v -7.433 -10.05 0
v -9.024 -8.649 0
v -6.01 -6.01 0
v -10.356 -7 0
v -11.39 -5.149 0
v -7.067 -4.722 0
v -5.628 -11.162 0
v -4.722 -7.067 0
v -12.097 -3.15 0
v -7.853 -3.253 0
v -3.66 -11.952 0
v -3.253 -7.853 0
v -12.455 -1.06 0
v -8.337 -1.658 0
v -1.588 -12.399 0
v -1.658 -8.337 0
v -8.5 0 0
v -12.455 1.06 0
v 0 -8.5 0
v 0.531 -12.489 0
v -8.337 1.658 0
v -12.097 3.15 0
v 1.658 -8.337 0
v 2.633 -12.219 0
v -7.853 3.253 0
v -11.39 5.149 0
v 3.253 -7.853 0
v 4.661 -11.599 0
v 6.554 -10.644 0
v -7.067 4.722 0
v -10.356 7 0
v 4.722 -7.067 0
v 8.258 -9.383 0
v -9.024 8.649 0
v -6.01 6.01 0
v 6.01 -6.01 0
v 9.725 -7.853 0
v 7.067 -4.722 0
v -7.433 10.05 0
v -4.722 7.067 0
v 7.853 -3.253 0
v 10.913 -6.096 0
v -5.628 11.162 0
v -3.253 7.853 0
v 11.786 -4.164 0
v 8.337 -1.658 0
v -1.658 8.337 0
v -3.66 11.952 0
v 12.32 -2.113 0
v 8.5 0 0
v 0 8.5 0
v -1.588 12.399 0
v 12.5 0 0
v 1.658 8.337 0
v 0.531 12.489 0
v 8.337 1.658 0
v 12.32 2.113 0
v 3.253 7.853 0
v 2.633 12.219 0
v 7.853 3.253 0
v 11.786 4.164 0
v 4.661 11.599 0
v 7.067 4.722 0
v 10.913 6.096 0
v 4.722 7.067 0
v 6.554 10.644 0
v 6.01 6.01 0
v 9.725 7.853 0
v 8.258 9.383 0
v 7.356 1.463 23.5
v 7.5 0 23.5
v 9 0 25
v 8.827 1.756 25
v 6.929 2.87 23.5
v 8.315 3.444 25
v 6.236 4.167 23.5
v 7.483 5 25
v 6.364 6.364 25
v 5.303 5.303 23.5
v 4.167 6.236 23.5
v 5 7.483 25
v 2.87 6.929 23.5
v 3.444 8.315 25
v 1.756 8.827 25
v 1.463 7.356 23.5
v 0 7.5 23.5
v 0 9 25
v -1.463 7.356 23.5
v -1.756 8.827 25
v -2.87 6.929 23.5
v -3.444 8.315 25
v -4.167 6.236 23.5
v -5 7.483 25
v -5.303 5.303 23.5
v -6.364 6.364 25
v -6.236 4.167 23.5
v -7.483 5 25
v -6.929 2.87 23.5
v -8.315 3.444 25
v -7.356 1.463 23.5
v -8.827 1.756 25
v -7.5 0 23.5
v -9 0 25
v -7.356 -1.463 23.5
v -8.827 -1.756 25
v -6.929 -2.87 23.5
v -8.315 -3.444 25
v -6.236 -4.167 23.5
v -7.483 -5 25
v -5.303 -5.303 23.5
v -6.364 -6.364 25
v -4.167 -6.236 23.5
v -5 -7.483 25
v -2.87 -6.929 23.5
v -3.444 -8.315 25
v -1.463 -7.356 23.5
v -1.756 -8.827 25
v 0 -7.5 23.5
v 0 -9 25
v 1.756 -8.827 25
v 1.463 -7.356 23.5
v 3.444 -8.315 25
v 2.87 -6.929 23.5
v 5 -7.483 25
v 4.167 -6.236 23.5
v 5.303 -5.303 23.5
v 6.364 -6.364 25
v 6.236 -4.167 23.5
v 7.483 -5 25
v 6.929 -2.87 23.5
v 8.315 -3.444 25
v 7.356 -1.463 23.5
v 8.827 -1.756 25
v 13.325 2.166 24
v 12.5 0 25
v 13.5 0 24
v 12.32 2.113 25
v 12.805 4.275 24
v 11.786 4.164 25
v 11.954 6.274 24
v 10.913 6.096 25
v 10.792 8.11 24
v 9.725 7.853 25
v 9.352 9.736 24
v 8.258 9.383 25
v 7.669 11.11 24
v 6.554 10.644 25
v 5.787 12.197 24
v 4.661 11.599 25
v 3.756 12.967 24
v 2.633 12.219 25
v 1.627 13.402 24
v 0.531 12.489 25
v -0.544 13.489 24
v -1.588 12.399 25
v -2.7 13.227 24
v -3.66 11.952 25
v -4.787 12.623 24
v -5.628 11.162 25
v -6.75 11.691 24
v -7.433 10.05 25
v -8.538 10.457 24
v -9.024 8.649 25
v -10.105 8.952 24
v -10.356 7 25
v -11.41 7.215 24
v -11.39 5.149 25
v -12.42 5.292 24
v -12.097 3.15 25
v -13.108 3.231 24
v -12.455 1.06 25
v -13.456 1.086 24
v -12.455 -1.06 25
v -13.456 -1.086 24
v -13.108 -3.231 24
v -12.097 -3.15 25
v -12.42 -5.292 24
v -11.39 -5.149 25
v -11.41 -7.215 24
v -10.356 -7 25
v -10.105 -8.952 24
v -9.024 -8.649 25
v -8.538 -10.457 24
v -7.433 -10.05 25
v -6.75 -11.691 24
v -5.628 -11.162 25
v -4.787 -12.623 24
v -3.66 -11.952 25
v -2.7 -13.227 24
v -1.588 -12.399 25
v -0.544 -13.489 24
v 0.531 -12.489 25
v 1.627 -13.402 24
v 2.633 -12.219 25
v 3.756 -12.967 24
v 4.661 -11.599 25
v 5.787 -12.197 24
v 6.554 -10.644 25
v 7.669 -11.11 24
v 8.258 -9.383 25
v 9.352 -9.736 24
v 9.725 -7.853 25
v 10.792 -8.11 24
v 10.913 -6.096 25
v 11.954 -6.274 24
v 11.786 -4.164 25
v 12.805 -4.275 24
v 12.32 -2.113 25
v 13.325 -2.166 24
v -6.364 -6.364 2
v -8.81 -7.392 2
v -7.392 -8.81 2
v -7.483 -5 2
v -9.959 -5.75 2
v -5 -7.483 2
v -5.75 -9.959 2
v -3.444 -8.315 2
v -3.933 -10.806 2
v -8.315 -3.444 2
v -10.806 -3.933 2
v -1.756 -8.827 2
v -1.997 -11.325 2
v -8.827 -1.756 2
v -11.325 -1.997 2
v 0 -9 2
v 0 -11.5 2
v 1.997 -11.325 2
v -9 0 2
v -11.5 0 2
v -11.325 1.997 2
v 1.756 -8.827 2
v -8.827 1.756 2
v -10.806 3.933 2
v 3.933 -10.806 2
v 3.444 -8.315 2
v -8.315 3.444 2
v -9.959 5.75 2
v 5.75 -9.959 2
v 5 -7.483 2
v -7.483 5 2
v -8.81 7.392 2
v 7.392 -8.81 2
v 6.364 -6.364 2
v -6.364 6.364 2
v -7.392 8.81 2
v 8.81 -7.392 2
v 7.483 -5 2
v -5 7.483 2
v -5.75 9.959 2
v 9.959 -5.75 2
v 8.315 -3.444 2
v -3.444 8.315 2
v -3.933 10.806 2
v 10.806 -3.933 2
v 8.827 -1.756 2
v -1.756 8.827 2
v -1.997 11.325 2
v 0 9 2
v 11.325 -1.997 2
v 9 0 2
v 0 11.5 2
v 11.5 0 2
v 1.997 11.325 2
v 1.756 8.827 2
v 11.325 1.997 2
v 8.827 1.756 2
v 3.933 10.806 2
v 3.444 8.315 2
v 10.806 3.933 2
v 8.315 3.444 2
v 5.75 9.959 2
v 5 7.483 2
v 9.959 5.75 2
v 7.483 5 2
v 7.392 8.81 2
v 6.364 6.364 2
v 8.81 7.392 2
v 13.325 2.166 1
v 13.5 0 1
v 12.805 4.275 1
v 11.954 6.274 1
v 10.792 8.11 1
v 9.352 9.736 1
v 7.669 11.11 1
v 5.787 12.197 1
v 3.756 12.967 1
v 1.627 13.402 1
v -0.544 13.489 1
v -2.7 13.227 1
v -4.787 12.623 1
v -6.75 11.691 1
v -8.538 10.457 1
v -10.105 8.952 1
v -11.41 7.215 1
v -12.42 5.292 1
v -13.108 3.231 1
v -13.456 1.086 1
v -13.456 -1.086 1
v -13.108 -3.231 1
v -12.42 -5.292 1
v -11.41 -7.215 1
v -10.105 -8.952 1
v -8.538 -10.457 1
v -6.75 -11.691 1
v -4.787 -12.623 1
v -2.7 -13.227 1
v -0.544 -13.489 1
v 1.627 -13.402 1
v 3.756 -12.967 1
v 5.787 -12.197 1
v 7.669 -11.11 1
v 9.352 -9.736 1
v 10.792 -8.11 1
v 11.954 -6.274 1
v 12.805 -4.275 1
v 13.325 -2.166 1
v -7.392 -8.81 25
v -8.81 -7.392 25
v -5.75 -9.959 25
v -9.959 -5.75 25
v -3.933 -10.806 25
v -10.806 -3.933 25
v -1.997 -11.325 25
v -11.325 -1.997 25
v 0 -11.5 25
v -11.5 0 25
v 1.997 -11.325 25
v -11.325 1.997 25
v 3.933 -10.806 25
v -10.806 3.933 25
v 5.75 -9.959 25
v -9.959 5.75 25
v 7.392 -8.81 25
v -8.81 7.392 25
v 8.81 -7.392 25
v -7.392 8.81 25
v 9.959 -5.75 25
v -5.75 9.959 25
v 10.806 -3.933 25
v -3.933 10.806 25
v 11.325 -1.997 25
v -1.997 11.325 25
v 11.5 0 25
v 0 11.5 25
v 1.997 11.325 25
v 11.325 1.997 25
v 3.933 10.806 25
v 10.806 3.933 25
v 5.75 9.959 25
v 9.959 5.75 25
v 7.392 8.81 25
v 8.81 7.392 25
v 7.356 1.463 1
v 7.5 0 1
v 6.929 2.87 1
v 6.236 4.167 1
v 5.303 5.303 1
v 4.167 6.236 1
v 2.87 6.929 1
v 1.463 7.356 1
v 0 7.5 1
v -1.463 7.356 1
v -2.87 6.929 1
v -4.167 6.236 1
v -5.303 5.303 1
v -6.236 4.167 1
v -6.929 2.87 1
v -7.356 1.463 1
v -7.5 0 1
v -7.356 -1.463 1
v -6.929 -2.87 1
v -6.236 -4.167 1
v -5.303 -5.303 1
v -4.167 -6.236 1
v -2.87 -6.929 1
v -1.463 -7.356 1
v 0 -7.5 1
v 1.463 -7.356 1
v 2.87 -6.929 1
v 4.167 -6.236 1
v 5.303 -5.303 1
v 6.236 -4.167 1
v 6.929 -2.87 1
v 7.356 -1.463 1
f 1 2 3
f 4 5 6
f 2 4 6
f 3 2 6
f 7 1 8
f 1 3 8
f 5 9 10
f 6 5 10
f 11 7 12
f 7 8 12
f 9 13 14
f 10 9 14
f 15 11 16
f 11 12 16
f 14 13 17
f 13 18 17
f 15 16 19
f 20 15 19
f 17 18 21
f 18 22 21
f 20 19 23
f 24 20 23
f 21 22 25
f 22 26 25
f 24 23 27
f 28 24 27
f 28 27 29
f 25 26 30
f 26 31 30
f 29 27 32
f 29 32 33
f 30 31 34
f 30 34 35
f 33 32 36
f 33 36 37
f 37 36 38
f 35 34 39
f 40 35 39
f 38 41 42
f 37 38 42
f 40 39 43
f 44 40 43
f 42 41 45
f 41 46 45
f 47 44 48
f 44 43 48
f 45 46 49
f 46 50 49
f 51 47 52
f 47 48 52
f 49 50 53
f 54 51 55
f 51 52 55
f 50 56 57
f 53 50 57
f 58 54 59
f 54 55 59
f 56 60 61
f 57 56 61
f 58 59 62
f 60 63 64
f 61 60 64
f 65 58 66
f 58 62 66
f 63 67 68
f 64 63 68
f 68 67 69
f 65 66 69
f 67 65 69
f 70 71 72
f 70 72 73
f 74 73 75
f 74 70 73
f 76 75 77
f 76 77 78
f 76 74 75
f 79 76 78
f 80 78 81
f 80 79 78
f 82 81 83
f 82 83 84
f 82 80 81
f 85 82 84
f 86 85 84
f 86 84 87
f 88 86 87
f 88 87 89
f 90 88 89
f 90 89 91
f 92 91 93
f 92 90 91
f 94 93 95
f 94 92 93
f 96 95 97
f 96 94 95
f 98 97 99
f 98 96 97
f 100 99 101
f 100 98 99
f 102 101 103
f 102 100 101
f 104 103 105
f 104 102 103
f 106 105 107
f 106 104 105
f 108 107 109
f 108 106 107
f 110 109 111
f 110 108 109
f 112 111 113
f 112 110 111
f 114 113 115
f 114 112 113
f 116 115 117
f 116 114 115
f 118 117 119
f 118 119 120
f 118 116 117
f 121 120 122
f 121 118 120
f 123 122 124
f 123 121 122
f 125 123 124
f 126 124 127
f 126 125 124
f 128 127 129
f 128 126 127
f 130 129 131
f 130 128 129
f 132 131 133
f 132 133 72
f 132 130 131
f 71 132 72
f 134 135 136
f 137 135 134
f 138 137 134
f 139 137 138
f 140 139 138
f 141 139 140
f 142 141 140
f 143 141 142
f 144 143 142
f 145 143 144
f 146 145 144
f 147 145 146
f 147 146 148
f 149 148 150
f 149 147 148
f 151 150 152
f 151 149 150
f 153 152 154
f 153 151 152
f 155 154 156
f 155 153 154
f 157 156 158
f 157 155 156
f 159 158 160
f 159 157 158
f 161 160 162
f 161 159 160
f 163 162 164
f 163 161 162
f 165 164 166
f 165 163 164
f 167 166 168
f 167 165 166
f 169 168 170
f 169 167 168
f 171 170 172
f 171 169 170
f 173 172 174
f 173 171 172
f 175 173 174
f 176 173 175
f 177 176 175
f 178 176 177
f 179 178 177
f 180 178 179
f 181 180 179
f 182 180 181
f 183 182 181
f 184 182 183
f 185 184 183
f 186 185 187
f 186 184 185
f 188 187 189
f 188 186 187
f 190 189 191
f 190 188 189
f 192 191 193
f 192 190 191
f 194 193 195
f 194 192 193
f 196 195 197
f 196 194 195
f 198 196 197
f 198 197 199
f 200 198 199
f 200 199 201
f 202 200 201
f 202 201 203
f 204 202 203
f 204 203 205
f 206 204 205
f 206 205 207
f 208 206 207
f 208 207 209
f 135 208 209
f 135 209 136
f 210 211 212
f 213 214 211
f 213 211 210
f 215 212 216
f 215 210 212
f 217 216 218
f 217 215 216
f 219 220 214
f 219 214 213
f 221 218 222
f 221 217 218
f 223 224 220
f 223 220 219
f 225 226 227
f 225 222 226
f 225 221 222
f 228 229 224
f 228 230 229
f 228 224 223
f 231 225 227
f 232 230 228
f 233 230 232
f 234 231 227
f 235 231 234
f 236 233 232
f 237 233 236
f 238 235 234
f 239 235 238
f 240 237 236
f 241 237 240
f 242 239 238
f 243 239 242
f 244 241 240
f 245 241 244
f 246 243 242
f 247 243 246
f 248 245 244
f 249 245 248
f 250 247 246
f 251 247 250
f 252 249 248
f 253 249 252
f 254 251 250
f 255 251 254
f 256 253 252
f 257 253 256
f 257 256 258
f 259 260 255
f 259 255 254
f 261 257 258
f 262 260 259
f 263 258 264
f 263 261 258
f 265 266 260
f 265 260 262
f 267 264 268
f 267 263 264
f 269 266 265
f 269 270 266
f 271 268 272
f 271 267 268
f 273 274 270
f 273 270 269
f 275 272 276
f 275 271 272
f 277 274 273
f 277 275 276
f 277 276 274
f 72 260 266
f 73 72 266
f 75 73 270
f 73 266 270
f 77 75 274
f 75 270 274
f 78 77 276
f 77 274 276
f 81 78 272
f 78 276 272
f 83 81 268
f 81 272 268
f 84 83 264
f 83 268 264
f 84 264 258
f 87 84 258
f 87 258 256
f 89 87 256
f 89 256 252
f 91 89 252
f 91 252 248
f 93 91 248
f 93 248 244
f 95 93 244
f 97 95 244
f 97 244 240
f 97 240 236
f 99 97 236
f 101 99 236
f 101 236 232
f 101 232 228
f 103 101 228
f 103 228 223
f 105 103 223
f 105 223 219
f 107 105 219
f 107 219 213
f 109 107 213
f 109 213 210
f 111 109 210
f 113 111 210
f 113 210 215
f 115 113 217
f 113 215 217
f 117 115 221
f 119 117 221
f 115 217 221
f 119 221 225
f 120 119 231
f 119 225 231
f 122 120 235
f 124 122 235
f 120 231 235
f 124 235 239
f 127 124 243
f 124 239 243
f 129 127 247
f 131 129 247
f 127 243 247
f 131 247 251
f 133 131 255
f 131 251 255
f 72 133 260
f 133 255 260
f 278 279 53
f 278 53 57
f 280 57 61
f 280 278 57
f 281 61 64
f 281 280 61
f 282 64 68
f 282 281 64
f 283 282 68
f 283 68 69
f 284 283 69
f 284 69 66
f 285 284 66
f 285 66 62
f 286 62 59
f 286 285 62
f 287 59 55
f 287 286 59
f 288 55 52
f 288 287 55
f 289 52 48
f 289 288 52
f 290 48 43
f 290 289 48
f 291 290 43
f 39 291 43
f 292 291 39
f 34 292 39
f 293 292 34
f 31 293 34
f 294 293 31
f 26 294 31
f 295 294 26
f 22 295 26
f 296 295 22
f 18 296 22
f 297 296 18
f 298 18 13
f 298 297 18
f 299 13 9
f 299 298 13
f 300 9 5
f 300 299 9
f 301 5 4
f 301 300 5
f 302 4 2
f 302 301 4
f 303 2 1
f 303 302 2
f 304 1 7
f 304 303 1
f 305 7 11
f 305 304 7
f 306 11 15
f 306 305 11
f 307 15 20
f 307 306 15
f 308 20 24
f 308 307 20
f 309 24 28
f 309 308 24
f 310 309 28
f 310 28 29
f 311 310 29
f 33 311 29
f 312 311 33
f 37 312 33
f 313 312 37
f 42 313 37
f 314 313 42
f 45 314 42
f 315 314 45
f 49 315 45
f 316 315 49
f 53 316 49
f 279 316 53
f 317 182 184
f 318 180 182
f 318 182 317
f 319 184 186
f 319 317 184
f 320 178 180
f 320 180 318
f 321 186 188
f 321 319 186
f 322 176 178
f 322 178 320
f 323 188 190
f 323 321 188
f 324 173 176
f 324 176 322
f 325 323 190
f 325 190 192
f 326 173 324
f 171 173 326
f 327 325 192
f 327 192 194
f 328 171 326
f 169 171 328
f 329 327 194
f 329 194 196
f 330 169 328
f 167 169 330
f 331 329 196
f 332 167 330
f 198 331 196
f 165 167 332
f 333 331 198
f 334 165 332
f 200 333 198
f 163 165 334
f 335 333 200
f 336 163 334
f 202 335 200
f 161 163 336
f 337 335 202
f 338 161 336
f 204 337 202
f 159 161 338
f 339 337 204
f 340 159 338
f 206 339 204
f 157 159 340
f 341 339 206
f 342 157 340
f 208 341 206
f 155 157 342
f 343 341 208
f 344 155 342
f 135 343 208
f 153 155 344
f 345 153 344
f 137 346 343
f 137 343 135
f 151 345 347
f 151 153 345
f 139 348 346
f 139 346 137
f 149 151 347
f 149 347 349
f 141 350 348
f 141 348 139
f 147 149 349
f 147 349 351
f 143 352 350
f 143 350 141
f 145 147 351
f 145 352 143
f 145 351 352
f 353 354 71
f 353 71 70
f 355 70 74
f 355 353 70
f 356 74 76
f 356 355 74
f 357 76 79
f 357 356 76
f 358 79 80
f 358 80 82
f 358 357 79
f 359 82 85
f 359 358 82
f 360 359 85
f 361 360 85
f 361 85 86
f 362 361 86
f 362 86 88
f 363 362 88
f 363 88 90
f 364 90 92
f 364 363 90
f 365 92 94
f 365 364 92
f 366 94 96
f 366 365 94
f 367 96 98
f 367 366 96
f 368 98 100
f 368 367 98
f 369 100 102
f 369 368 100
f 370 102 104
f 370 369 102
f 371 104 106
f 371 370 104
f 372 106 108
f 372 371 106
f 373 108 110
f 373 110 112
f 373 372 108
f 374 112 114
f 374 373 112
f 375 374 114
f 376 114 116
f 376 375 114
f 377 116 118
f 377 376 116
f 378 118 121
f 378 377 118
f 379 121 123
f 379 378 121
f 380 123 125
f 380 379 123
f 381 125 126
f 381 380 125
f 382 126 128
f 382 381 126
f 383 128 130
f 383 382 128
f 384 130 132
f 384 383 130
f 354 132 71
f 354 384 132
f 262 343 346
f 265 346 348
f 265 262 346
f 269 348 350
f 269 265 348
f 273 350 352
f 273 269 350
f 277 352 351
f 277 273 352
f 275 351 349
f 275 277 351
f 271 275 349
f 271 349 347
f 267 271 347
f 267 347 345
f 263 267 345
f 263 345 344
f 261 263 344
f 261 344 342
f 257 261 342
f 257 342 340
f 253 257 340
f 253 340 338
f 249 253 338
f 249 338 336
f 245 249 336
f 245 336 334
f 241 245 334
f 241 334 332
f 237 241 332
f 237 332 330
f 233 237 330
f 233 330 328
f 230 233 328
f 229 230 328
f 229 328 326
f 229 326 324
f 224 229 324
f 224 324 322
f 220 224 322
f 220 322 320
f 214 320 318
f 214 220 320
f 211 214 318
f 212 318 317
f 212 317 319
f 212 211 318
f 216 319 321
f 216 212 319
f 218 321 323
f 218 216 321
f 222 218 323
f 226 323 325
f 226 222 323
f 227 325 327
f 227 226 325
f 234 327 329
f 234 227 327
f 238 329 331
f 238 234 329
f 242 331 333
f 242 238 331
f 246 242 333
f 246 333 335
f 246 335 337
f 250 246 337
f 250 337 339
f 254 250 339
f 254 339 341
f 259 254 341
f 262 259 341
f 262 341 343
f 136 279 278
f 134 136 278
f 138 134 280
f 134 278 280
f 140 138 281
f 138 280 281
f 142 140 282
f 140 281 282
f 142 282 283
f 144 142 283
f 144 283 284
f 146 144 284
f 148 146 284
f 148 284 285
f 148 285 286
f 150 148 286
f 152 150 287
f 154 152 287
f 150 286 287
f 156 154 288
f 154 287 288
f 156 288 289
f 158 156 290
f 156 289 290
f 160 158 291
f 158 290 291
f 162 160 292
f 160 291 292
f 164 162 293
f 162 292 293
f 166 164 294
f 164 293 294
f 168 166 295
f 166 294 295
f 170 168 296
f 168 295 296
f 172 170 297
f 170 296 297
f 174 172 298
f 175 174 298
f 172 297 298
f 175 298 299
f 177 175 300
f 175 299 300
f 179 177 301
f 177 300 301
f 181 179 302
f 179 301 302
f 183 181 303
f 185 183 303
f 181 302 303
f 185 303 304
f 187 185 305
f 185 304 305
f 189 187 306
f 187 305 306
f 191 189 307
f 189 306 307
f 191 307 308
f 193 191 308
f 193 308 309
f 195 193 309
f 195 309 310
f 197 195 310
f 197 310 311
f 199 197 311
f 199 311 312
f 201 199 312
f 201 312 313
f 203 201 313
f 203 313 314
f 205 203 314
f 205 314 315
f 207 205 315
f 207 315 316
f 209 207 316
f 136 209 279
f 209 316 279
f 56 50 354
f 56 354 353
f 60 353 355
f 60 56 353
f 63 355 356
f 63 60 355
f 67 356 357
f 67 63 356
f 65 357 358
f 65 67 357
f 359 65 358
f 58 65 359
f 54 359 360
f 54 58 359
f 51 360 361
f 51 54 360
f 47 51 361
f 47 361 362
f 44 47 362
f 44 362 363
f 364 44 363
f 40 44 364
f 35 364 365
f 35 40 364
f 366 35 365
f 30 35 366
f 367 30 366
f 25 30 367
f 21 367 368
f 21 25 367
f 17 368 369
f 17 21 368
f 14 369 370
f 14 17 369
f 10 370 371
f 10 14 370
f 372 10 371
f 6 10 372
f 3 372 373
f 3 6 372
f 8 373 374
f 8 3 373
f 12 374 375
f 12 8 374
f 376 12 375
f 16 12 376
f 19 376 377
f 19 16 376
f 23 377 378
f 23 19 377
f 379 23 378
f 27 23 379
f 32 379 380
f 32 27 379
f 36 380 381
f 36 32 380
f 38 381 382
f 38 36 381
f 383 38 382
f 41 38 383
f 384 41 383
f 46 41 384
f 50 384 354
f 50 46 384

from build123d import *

# Parameters (mm, degrees)
F2_R     = 13.5
F2_R_2   = 11.5
F2_R_3   = 9
F2_R_4   = 7.5
F3_DEPTH = 2
F4_DEPTH = 25
F5_SIZE  = 1.49999
F6_SIZE  = 1


# Not quite as in the source:
# - a fillet or chamfer is up to 0.001 mm smaller than in the source, because OpenCascade refuses the exact size


with BuildPart() as f3:
    # F2 (on Top) → F3 (new body)
    with BuildSketch(Plane.XY):
        Circle(F2_R)
        Circle(F2_R_2, mode=Mode.SUBTRACT)
        Circle(F2_R_2)
        Circle(F2_R_3, mode=Mode.SUBTRACT)
        Circle(F2_R_3)
        Circle(F2_R_4, mode=Mode.SUBTRACT)
    extrude(amount=F3_DEPTH)

    # F2 (on Top) → F4 (join)
    with BuildSketch(Plane.XY):
        Circle(F2_R)
        Circle(F2_R_2, mode=Mode.SUBTRACT)
        Circle(F2_R_3)
        Circle(F2_R_4, mode=Mode.SUBTRACT)
    extrude(amount=F4_DEPTH)

    # F5 (size 1.5 in the source; OpenCascade refuses exactly that, so slightly less here)
    f5_edges = [f3.edges().sort_by_distance(p)[0] for p in [
        (-7.5, 0, 25),
    ]]
    chamfer(f5_edges, length=F5_SIZE)

    # F6
    f6_edges = [f3.edges().sort_by_distance(p)[0] for p in [
        (-13.5, 0, 25),
        (-13.5, 0, 0),
        (-7.5, 0, 0),
    ]]
    chamfer(f6_edges, length=F6_SIZE)


solid = f3.part
